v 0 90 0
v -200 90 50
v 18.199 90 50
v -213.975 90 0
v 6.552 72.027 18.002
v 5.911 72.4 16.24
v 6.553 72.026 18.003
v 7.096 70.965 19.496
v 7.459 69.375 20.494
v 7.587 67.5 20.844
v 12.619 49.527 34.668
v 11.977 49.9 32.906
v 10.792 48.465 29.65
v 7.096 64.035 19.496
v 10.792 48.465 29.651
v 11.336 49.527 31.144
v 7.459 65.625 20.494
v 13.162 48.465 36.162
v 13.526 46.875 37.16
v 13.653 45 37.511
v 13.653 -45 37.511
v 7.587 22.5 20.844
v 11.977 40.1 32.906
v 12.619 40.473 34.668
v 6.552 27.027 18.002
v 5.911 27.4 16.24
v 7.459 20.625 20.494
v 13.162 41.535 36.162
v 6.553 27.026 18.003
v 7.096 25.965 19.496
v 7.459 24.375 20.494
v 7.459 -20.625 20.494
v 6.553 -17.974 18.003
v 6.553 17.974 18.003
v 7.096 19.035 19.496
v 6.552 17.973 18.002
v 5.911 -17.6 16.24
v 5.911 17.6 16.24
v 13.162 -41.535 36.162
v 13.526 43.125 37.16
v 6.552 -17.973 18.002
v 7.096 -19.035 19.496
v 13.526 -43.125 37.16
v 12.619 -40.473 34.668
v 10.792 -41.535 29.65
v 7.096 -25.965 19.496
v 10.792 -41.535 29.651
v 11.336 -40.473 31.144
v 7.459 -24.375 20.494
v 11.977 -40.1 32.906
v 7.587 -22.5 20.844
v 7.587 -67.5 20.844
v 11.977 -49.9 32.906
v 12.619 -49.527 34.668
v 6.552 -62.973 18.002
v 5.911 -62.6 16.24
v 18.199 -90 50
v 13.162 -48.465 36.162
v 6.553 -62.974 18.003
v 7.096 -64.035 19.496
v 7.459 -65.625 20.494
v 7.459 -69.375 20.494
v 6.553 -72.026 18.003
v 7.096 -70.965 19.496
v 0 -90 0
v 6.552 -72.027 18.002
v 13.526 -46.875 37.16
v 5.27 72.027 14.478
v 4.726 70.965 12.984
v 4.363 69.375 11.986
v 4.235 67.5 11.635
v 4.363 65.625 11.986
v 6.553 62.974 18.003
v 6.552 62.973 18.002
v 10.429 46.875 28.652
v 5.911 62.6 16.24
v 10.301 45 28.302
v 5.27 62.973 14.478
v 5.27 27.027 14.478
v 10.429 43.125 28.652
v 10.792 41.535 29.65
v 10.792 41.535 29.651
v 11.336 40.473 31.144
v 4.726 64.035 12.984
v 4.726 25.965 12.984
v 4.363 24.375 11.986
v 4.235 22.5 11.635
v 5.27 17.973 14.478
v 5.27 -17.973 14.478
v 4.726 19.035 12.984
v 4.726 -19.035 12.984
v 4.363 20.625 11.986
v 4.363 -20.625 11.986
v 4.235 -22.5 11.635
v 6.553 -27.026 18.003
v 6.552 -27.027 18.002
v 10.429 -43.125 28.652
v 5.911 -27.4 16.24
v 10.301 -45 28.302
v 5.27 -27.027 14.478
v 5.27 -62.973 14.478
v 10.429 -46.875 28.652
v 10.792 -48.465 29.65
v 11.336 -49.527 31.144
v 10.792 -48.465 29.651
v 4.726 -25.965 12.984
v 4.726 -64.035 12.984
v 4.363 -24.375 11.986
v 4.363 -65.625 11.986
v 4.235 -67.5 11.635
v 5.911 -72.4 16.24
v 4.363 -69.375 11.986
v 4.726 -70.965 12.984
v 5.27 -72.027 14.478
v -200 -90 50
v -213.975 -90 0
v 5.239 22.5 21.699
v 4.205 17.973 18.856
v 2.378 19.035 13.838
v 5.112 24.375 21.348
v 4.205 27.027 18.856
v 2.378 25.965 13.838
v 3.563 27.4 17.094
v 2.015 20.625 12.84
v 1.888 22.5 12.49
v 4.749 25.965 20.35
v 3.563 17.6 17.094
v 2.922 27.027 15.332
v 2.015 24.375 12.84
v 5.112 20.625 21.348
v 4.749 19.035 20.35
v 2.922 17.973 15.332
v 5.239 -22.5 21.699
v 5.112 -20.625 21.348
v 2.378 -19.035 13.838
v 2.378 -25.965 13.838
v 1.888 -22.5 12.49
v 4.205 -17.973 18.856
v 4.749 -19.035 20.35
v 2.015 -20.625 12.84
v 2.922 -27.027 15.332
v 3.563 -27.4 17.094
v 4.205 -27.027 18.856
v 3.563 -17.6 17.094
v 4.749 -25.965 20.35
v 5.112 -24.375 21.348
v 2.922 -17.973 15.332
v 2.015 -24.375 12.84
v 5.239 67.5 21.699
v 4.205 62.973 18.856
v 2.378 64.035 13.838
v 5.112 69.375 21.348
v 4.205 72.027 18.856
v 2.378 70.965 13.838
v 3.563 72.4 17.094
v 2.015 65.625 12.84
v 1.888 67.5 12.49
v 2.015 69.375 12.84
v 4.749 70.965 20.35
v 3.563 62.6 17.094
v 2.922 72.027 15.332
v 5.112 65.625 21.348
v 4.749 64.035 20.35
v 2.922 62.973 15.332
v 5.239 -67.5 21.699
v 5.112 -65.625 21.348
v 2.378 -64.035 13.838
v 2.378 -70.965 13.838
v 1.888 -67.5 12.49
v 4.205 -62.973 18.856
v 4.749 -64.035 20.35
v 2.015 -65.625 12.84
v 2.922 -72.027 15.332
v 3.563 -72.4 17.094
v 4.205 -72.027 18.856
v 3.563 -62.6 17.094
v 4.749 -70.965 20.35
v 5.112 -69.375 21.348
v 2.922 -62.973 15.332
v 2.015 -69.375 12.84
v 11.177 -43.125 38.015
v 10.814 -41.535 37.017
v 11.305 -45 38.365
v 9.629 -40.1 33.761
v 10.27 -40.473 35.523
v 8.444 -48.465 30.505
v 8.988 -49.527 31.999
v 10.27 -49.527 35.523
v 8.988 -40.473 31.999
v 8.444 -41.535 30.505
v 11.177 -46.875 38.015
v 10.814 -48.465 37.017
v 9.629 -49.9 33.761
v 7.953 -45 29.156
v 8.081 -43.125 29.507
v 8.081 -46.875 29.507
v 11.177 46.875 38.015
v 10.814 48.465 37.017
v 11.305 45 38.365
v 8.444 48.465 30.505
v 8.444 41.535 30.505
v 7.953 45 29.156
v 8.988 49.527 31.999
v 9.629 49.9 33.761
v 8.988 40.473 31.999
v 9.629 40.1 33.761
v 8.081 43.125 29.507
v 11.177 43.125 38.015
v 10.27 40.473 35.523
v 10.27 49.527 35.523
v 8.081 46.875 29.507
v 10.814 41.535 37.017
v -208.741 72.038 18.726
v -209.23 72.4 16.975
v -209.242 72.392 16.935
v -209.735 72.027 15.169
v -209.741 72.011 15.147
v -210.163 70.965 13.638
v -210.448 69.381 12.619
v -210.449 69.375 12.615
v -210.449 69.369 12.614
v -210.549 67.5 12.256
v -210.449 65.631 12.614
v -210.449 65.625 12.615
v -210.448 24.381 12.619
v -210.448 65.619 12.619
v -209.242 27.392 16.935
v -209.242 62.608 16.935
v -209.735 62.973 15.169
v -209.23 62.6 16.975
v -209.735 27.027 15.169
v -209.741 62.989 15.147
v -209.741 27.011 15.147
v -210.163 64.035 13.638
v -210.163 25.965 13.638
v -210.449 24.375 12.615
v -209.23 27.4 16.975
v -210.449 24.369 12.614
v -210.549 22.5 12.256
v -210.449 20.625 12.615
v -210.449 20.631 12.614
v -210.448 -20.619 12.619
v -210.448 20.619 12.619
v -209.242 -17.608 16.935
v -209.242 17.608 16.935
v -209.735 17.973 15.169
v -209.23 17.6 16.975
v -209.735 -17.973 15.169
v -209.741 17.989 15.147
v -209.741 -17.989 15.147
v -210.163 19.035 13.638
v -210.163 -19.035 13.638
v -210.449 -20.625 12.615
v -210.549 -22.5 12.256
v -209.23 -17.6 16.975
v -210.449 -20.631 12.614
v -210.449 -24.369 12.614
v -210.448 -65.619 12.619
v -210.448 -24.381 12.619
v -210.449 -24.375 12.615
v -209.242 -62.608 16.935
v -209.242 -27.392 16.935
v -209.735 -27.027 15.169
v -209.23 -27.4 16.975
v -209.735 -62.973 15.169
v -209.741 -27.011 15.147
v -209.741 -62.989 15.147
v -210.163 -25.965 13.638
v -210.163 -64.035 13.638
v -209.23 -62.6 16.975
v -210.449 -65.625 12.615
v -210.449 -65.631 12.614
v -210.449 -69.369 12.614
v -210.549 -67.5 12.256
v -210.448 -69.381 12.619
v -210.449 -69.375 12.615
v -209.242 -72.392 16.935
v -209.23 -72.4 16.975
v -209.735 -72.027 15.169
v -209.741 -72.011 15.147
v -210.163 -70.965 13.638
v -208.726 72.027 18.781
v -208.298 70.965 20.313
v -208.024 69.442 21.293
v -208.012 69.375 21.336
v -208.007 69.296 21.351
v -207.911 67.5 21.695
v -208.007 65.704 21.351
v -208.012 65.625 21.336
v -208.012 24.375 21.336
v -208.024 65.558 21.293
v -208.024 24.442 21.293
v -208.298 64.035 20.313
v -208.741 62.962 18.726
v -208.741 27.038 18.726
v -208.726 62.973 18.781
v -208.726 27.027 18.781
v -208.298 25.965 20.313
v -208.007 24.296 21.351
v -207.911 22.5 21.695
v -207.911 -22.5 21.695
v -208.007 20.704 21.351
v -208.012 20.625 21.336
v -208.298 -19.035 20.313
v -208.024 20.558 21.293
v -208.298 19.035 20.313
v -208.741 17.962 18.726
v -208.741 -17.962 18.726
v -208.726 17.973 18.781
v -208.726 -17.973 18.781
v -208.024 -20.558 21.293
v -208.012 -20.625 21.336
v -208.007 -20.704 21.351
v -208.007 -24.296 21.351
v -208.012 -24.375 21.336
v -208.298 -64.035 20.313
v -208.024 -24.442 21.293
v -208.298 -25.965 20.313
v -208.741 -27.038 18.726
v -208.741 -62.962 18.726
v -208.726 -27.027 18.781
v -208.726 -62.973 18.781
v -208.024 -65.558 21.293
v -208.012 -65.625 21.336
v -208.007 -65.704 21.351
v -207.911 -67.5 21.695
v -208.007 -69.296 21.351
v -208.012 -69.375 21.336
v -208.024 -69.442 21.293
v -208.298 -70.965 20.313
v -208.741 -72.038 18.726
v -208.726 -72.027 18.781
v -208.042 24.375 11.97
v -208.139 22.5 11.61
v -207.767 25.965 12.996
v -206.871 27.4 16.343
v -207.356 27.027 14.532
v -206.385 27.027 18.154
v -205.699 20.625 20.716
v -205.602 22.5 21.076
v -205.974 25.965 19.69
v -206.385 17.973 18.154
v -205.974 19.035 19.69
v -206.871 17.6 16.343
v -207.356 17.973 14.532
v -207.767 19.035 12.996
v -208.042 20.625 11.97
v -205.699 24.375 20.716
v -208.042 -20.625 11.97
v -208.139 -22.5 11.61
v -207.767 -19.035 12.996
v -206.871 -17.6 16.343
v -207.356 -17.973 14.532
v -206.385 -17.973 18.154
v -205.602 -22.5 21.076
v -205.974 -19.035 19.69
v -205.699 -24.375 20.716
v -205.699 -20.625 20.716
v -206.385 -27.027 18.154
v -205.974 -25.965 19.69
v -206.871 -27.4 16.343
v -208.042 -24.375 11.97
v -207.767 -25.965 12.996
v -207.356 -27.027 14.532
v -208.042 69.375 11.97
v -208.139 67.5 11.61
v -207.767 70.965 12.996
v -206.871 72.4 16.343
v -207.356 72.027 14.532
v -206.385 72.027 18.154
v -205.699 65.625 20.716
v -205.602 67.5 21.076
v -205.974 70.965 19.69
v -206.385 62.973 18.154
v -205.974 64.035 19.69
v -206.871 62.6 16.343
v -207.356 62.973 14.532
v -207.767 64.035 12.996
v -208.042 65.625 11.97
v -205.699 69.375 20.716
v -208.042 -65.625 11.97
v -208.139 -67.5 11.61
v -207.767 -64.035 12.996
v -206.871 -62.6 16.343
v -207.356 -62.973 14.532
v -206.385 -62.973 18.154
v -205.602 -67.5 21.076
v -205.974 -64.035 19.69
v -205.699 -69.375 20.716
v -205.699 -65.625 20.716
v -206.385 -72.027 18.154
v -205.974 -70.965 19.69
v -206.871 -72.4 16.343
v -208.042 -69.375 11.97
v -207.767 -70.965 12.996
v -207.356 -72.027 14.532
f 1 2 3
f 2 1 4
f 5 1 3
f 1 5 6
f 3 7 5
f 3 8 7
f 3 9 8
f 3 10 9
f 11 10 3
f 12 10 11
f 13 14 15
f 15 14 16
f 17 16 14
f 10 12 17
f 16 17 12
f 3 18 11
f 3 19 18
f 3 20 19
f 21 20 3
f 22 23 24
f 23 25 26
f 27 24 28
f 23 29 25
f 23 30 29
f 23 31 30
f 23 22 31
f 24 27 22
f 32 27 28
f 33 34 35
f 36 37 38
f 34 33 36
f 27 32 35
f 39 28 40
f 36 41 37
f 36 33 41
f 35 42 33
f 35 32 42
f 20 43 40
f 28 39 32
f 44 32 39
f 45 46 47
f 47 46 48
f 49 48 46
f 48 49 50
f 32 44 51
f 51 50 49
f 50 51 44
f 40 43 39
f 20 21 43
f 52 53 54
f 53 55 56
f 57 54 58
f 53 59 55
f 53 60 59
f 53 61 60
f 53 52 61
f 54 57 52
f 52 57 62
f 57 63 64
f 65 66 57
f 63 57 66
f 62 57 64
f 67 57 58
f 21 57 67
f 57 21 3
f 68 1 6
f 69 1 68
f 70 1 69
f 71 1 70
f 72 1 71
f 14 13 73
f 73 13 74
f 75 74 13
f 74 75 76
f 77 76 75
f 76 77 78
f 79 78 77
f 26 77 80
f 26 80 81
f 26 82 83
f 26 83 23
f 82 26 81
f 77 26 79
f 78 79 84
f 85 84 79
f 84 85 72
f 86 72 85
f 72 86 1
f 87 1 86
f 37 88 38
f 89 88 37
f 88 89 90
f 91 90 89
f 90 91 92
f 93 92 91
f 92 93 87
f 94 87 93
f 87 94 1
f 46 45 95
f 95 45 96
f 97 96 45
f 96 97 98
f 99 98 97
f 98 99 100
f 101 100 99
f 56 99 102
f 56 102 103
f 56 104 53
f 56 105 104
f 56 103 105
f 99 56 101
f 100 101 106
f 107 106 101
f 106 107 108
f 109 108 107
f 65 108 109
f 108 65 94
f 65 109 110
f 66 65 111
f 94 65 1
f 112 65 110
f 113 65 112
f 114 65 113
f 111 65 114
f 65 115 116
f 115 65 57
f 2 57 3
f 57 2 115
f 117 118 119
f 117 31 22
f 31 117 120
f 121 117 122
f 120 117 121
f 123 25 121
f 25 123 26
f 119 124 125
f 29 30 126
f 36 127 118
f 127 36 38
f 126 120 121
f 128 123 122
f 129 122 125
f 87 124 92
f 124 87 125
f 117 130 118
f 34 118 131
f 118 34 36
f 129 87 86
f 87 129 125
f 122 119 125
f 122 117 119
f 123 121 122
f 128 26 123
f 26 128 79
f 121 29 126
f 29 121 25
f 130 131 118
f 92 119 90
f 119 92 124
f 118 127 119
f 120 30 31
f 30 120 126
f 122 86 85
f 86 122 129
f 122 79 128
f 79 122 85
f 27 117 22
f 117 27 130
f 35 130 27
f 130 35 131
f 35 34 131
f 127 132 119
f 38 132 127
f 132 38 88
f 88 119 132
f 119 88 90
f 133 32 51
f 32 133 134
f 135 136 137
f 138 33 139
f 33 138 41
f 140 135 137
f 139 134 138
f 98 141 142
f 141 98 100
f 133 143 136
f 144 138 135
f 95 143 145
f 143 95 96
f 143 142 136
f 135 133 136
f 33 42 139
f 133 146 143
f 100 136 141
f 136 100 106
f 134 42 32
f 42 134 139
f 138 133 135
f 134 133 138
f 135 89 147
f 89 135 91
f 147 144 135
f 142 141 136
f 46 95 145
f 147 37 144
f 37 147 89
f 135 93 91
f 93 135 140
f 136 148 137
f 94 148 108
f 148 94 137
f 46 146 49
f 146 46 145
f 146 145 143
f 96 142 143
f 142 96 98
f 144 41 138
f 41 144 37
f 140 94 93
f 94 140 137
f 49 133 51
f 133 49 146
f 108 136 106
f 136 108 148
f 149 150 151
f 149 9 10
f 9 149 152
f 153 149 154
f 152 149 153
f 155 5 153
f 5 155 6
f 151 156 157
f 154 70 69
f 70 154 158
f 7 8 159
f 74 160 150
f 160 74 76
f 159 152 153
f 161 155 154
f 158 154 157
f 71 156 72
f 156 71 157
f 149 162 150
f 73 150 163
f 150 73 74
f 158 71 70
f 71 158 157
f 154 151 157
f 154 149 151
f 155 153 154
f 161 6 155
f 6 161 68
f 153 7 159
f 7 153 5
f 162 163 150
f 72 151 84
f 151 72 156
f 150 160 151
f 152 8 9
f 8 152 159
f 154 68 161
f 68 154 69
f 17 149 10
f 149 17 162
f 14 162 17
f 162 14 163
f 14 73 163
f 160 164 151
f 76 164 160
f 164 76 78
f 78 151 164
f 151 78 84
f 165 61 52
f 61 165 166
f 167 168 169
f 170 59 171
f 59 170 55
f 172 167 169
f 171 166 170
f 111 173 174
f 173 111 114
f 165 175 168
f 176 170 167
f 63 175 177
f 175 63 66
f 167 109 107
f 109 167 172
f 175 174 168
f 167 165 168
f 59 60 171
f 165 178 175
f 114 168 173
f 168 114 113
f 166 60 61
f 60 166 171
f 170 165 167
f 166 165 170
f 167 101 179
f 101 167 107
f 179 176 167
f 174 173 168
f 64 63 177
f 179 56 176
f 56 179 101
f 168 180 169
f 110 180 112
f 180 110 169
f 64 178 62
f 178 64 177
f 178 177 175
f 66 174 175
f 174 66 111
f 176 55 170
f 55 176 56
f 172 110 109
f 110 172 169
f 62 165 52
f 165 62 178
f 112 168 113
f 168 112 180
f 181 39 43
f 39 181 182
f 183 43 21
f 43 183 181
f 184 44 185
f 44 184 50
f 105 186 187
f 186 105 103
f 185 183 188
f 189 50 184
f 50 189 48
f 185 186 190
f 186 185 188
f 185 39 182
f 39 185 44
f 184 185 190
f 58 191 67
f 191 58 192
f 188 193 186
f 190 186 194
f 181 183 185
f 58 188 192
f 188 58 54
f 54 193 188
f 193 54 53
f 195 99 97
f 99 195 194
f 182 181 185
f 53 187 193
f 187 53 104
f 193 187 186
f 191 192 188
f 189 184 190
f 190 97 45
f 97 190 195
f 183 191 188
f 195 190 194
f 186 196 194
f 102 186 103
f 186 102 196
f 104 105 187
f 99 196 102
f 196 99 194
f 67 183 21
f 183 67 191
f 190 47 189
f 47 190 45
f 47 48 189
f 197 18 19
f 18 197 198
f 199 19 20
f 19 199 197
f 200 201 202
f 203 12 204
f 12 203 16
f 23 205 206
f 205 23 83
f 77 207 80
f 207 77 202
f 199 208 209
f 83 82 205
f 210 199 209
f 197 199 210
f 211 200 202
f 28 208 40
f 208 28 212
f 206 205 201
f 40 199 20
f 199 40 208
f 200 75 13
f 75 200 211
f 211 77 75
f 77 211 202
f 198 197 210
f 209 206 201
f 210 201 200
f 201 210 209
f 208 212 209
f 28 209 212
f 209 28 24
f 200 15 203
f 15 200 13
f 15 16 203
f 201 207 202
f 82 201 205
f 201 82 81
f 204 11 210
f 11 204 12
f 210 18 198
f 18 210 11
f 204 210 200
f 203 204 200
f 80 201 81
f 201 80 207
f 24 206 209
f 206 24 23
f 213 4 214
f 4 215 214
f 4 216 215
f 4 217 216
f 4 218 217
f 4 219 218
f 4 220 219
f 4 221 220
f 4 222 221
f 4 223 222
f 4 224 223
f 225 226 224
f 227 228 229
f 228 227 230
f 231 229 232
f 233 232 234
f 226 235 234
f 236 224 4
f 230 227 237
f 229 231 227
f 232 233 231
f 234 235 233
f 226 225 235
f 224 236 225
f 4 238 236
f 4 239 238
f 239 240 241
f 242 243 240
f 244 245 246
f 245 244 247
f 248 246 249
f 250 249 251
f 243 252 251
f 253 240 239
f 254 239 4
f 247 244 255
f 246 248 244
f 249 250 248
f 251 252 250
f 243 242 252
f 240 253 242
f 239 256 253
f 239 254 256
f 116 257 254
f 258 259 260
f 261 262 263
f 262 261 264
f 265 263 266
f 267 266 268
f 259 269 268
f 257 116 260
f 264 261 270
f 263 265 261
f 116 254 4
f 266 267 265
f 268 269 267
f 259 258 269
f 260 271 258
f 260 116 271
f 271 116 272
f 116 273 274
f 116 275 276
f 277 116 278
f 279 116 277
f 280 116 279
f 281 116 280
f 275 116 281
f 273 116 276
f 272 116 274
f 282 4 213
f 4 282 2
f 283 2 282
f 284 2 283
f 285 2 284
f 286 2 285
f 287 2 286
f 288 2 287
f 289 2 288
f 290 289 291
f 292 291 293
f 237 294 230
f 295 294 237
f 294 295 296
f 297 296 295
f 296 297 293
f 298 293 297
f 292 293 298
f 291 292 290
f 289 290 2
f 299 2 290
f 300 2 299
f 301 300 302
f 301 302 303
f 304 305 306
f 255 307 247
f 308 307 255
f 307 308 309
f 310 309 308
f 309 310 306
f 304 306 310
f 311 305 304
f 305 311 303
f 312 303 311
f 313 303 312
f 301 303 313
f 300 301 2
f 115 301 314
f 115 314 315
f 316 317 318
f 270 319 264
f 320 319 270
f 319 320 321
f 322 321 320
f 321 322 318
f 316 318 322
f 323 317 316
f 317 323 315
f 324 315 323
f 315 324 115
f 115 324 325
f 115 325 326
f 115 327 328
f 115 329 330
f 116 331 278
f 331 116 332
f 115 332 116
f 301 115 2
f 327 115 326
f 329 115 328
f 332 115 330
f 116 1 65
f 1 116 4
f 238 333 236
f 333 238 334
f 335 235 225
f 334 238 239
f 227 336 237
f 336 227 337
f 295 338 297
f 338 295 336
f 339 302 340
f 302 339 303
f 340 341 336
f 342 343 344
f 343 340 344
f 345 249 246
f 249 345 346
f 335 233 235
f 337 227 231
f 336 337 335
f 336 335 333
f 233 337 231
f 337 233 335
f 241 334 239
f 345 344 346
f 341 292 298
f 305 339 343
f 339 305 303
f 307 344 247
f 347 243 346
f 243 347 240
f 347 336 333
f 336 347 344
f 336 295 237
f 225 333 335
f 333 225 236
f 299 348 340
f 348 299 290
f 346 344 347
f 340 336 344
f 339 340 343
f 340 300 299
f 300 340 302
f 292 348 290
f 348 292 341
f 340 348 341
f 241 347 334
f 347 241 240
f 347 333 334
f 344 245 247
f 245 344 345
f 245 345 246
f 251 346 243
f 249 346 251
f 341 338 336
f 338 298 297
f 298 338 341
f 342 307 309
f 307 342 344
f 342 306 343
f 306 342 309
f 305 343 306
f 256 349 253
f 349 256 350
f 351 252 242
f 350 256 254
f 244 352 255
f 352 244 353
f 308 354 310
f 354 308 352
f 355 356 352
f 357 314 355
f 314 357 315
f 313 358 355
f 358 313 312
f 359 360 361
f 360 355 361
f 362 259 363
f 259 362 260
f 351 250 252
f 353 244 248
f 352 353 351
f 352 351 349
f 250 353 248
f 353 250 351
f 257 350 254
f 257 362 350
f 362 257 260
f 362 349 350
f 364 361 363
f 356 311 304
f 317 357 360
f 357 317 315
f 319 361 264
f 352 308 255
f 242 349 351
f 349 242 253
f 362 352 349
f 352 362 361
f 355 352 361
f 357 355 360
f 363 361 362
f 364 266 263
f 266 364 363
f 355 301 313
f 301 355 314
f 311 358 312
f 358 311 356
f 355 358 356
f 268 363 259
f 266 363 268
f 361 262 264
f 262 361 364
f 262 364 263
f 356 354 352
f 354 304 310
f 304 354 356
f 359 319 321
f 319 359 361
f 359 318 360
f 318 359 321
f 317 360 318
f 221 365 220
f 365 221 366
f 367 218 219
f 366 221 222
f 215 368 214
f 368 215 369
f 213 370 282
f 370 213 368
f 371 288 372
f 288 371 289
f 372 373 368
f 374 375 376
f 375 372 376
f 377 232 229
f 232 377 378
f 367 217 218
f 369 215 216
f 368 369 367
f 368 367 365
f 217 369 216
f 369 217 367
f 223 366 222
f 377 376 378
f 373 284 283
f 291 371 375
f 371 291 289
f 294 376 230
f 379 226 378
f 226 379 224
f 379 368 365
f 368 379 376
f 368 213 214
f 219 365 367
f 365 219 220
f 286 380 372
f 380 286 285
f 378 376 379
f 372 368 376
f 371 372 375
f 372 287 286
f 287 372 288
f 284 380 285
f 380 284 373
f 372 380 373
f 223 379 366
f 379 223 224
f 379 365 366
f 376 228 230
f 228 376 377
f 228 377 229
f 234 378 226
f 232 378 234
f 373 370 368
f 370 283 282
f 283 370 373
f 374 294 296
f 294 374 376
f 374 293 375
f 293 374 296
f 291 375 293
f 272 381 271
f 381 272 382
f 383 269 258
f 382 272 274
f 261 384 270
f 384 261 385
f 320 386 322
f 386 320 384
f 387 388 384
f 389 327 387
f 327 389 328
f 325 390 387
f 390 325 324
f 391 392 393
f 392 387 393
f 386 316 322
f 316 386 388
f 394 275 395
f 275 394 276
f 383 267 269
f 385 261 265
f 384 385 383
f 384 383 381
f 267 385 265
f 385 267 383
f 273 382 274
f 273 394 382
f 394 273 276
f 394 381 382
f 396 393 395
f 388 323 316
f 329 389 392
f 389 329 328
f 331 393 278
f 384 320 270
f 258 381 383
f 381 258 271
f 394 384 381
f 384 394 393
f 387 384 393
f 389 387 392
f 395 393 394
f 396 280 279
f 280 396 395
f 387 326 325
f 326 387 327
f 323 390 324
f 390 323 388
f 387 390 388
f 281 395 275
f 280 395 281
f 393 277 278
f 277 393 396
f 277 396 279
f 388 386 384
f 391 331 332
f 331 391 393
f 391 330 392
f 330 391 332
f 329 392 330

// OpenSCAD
width = 180;
height = 50;
length = 200;
winkela = 18.199;
winkelb = 13.975;
material = 5;


lochd = 9.8;
locht = 2.5;


// 20° Seite
difference(){
    translate([0, width / 2, 0]){
        rotate([90, 0, 0]){
            linear_extrude(height = width){
                polygon(points=[
                [0, height], [winkela, height], [0, 0]
                ]);
            }
        }
    }
translate([winkela / 3.841, 1 * width / 8, height / 3]){
rotate([0, -70, 0]){
cylinder(h=locht, r=lochd/2, center=true);
}}
translate([winkela / 3.841, 1 * -width / 8, height / 3]){
rotate([0, -70, 0]){
cylinder(h=locht, r=lochd/2, center=true);
}}

translate([winkela / 3.841, 3 * width / 8, height / 3]){
rotate([0, -70, 0]){
cylinder(h=locht, r=lochd/2, center=true);
}}
translate([winkela / 3.841, 3 * -width / 8, height / 3]){
rotate([0, -70, 0]){
cylinder(h=locht, r=lochd/2, center=true);
}}


translate([2 * winkela / 3.3691, -width / 4, 2 * height / 3]){
rotate([0, -70, 0]){
cylinder(h=locht, r=lochd/2, center=true);
}}

translate([2 * winkela / 3.3691, width / 4, 2 * height / 3]){
rotate([0, -70, 0]){
cylinder(h=locht, r=lochd/2, center=true);
}}

}




 // Block
 translate([-length / 2,0, height / 2])
 cube([length,width, height], center = true);



// 15° Seite

 translate([-length, 0, height]){ 
 rotate([180, 0, 180]){
     difference(){
     translate([0, width / 2, 0]){
        rotate([90, 0, 0]){
            linear_extrude(height = width){
                polygon(points=[
                [0, height], [winkelb, height], [0, 0]
                ]);
            }
        }
    }
    translate([2 * winkelb / 3.46, width / 8, 2 * height / 3]){
        rotate([0, -75, 0]){
            cylinder(h=locht, r=lochd/2, center=true);
}}
    translate([2 * winkelb / 3.46, -width / 8, 2 * height / 3]){
        rotate([0, -75, 0]){
            cylinder(h=locht, r=lochd/2, center=true);
}}
    translate([2 * winkelb / 3.46, 3 * width / 8, 2 * height / 3]){
        rotate([0, -75, 0]){
            cylinder(h=locht, r=lochd/2, center=true);
}}
    translate([2 * winkelb / 3.46, 3 * -width / 8, 2 * height / 3]){
        rotate([0, -75, 0]){
            cylinder(h=locht, r=lochd/2, center=true);
}}

 }
 
 
 }}
